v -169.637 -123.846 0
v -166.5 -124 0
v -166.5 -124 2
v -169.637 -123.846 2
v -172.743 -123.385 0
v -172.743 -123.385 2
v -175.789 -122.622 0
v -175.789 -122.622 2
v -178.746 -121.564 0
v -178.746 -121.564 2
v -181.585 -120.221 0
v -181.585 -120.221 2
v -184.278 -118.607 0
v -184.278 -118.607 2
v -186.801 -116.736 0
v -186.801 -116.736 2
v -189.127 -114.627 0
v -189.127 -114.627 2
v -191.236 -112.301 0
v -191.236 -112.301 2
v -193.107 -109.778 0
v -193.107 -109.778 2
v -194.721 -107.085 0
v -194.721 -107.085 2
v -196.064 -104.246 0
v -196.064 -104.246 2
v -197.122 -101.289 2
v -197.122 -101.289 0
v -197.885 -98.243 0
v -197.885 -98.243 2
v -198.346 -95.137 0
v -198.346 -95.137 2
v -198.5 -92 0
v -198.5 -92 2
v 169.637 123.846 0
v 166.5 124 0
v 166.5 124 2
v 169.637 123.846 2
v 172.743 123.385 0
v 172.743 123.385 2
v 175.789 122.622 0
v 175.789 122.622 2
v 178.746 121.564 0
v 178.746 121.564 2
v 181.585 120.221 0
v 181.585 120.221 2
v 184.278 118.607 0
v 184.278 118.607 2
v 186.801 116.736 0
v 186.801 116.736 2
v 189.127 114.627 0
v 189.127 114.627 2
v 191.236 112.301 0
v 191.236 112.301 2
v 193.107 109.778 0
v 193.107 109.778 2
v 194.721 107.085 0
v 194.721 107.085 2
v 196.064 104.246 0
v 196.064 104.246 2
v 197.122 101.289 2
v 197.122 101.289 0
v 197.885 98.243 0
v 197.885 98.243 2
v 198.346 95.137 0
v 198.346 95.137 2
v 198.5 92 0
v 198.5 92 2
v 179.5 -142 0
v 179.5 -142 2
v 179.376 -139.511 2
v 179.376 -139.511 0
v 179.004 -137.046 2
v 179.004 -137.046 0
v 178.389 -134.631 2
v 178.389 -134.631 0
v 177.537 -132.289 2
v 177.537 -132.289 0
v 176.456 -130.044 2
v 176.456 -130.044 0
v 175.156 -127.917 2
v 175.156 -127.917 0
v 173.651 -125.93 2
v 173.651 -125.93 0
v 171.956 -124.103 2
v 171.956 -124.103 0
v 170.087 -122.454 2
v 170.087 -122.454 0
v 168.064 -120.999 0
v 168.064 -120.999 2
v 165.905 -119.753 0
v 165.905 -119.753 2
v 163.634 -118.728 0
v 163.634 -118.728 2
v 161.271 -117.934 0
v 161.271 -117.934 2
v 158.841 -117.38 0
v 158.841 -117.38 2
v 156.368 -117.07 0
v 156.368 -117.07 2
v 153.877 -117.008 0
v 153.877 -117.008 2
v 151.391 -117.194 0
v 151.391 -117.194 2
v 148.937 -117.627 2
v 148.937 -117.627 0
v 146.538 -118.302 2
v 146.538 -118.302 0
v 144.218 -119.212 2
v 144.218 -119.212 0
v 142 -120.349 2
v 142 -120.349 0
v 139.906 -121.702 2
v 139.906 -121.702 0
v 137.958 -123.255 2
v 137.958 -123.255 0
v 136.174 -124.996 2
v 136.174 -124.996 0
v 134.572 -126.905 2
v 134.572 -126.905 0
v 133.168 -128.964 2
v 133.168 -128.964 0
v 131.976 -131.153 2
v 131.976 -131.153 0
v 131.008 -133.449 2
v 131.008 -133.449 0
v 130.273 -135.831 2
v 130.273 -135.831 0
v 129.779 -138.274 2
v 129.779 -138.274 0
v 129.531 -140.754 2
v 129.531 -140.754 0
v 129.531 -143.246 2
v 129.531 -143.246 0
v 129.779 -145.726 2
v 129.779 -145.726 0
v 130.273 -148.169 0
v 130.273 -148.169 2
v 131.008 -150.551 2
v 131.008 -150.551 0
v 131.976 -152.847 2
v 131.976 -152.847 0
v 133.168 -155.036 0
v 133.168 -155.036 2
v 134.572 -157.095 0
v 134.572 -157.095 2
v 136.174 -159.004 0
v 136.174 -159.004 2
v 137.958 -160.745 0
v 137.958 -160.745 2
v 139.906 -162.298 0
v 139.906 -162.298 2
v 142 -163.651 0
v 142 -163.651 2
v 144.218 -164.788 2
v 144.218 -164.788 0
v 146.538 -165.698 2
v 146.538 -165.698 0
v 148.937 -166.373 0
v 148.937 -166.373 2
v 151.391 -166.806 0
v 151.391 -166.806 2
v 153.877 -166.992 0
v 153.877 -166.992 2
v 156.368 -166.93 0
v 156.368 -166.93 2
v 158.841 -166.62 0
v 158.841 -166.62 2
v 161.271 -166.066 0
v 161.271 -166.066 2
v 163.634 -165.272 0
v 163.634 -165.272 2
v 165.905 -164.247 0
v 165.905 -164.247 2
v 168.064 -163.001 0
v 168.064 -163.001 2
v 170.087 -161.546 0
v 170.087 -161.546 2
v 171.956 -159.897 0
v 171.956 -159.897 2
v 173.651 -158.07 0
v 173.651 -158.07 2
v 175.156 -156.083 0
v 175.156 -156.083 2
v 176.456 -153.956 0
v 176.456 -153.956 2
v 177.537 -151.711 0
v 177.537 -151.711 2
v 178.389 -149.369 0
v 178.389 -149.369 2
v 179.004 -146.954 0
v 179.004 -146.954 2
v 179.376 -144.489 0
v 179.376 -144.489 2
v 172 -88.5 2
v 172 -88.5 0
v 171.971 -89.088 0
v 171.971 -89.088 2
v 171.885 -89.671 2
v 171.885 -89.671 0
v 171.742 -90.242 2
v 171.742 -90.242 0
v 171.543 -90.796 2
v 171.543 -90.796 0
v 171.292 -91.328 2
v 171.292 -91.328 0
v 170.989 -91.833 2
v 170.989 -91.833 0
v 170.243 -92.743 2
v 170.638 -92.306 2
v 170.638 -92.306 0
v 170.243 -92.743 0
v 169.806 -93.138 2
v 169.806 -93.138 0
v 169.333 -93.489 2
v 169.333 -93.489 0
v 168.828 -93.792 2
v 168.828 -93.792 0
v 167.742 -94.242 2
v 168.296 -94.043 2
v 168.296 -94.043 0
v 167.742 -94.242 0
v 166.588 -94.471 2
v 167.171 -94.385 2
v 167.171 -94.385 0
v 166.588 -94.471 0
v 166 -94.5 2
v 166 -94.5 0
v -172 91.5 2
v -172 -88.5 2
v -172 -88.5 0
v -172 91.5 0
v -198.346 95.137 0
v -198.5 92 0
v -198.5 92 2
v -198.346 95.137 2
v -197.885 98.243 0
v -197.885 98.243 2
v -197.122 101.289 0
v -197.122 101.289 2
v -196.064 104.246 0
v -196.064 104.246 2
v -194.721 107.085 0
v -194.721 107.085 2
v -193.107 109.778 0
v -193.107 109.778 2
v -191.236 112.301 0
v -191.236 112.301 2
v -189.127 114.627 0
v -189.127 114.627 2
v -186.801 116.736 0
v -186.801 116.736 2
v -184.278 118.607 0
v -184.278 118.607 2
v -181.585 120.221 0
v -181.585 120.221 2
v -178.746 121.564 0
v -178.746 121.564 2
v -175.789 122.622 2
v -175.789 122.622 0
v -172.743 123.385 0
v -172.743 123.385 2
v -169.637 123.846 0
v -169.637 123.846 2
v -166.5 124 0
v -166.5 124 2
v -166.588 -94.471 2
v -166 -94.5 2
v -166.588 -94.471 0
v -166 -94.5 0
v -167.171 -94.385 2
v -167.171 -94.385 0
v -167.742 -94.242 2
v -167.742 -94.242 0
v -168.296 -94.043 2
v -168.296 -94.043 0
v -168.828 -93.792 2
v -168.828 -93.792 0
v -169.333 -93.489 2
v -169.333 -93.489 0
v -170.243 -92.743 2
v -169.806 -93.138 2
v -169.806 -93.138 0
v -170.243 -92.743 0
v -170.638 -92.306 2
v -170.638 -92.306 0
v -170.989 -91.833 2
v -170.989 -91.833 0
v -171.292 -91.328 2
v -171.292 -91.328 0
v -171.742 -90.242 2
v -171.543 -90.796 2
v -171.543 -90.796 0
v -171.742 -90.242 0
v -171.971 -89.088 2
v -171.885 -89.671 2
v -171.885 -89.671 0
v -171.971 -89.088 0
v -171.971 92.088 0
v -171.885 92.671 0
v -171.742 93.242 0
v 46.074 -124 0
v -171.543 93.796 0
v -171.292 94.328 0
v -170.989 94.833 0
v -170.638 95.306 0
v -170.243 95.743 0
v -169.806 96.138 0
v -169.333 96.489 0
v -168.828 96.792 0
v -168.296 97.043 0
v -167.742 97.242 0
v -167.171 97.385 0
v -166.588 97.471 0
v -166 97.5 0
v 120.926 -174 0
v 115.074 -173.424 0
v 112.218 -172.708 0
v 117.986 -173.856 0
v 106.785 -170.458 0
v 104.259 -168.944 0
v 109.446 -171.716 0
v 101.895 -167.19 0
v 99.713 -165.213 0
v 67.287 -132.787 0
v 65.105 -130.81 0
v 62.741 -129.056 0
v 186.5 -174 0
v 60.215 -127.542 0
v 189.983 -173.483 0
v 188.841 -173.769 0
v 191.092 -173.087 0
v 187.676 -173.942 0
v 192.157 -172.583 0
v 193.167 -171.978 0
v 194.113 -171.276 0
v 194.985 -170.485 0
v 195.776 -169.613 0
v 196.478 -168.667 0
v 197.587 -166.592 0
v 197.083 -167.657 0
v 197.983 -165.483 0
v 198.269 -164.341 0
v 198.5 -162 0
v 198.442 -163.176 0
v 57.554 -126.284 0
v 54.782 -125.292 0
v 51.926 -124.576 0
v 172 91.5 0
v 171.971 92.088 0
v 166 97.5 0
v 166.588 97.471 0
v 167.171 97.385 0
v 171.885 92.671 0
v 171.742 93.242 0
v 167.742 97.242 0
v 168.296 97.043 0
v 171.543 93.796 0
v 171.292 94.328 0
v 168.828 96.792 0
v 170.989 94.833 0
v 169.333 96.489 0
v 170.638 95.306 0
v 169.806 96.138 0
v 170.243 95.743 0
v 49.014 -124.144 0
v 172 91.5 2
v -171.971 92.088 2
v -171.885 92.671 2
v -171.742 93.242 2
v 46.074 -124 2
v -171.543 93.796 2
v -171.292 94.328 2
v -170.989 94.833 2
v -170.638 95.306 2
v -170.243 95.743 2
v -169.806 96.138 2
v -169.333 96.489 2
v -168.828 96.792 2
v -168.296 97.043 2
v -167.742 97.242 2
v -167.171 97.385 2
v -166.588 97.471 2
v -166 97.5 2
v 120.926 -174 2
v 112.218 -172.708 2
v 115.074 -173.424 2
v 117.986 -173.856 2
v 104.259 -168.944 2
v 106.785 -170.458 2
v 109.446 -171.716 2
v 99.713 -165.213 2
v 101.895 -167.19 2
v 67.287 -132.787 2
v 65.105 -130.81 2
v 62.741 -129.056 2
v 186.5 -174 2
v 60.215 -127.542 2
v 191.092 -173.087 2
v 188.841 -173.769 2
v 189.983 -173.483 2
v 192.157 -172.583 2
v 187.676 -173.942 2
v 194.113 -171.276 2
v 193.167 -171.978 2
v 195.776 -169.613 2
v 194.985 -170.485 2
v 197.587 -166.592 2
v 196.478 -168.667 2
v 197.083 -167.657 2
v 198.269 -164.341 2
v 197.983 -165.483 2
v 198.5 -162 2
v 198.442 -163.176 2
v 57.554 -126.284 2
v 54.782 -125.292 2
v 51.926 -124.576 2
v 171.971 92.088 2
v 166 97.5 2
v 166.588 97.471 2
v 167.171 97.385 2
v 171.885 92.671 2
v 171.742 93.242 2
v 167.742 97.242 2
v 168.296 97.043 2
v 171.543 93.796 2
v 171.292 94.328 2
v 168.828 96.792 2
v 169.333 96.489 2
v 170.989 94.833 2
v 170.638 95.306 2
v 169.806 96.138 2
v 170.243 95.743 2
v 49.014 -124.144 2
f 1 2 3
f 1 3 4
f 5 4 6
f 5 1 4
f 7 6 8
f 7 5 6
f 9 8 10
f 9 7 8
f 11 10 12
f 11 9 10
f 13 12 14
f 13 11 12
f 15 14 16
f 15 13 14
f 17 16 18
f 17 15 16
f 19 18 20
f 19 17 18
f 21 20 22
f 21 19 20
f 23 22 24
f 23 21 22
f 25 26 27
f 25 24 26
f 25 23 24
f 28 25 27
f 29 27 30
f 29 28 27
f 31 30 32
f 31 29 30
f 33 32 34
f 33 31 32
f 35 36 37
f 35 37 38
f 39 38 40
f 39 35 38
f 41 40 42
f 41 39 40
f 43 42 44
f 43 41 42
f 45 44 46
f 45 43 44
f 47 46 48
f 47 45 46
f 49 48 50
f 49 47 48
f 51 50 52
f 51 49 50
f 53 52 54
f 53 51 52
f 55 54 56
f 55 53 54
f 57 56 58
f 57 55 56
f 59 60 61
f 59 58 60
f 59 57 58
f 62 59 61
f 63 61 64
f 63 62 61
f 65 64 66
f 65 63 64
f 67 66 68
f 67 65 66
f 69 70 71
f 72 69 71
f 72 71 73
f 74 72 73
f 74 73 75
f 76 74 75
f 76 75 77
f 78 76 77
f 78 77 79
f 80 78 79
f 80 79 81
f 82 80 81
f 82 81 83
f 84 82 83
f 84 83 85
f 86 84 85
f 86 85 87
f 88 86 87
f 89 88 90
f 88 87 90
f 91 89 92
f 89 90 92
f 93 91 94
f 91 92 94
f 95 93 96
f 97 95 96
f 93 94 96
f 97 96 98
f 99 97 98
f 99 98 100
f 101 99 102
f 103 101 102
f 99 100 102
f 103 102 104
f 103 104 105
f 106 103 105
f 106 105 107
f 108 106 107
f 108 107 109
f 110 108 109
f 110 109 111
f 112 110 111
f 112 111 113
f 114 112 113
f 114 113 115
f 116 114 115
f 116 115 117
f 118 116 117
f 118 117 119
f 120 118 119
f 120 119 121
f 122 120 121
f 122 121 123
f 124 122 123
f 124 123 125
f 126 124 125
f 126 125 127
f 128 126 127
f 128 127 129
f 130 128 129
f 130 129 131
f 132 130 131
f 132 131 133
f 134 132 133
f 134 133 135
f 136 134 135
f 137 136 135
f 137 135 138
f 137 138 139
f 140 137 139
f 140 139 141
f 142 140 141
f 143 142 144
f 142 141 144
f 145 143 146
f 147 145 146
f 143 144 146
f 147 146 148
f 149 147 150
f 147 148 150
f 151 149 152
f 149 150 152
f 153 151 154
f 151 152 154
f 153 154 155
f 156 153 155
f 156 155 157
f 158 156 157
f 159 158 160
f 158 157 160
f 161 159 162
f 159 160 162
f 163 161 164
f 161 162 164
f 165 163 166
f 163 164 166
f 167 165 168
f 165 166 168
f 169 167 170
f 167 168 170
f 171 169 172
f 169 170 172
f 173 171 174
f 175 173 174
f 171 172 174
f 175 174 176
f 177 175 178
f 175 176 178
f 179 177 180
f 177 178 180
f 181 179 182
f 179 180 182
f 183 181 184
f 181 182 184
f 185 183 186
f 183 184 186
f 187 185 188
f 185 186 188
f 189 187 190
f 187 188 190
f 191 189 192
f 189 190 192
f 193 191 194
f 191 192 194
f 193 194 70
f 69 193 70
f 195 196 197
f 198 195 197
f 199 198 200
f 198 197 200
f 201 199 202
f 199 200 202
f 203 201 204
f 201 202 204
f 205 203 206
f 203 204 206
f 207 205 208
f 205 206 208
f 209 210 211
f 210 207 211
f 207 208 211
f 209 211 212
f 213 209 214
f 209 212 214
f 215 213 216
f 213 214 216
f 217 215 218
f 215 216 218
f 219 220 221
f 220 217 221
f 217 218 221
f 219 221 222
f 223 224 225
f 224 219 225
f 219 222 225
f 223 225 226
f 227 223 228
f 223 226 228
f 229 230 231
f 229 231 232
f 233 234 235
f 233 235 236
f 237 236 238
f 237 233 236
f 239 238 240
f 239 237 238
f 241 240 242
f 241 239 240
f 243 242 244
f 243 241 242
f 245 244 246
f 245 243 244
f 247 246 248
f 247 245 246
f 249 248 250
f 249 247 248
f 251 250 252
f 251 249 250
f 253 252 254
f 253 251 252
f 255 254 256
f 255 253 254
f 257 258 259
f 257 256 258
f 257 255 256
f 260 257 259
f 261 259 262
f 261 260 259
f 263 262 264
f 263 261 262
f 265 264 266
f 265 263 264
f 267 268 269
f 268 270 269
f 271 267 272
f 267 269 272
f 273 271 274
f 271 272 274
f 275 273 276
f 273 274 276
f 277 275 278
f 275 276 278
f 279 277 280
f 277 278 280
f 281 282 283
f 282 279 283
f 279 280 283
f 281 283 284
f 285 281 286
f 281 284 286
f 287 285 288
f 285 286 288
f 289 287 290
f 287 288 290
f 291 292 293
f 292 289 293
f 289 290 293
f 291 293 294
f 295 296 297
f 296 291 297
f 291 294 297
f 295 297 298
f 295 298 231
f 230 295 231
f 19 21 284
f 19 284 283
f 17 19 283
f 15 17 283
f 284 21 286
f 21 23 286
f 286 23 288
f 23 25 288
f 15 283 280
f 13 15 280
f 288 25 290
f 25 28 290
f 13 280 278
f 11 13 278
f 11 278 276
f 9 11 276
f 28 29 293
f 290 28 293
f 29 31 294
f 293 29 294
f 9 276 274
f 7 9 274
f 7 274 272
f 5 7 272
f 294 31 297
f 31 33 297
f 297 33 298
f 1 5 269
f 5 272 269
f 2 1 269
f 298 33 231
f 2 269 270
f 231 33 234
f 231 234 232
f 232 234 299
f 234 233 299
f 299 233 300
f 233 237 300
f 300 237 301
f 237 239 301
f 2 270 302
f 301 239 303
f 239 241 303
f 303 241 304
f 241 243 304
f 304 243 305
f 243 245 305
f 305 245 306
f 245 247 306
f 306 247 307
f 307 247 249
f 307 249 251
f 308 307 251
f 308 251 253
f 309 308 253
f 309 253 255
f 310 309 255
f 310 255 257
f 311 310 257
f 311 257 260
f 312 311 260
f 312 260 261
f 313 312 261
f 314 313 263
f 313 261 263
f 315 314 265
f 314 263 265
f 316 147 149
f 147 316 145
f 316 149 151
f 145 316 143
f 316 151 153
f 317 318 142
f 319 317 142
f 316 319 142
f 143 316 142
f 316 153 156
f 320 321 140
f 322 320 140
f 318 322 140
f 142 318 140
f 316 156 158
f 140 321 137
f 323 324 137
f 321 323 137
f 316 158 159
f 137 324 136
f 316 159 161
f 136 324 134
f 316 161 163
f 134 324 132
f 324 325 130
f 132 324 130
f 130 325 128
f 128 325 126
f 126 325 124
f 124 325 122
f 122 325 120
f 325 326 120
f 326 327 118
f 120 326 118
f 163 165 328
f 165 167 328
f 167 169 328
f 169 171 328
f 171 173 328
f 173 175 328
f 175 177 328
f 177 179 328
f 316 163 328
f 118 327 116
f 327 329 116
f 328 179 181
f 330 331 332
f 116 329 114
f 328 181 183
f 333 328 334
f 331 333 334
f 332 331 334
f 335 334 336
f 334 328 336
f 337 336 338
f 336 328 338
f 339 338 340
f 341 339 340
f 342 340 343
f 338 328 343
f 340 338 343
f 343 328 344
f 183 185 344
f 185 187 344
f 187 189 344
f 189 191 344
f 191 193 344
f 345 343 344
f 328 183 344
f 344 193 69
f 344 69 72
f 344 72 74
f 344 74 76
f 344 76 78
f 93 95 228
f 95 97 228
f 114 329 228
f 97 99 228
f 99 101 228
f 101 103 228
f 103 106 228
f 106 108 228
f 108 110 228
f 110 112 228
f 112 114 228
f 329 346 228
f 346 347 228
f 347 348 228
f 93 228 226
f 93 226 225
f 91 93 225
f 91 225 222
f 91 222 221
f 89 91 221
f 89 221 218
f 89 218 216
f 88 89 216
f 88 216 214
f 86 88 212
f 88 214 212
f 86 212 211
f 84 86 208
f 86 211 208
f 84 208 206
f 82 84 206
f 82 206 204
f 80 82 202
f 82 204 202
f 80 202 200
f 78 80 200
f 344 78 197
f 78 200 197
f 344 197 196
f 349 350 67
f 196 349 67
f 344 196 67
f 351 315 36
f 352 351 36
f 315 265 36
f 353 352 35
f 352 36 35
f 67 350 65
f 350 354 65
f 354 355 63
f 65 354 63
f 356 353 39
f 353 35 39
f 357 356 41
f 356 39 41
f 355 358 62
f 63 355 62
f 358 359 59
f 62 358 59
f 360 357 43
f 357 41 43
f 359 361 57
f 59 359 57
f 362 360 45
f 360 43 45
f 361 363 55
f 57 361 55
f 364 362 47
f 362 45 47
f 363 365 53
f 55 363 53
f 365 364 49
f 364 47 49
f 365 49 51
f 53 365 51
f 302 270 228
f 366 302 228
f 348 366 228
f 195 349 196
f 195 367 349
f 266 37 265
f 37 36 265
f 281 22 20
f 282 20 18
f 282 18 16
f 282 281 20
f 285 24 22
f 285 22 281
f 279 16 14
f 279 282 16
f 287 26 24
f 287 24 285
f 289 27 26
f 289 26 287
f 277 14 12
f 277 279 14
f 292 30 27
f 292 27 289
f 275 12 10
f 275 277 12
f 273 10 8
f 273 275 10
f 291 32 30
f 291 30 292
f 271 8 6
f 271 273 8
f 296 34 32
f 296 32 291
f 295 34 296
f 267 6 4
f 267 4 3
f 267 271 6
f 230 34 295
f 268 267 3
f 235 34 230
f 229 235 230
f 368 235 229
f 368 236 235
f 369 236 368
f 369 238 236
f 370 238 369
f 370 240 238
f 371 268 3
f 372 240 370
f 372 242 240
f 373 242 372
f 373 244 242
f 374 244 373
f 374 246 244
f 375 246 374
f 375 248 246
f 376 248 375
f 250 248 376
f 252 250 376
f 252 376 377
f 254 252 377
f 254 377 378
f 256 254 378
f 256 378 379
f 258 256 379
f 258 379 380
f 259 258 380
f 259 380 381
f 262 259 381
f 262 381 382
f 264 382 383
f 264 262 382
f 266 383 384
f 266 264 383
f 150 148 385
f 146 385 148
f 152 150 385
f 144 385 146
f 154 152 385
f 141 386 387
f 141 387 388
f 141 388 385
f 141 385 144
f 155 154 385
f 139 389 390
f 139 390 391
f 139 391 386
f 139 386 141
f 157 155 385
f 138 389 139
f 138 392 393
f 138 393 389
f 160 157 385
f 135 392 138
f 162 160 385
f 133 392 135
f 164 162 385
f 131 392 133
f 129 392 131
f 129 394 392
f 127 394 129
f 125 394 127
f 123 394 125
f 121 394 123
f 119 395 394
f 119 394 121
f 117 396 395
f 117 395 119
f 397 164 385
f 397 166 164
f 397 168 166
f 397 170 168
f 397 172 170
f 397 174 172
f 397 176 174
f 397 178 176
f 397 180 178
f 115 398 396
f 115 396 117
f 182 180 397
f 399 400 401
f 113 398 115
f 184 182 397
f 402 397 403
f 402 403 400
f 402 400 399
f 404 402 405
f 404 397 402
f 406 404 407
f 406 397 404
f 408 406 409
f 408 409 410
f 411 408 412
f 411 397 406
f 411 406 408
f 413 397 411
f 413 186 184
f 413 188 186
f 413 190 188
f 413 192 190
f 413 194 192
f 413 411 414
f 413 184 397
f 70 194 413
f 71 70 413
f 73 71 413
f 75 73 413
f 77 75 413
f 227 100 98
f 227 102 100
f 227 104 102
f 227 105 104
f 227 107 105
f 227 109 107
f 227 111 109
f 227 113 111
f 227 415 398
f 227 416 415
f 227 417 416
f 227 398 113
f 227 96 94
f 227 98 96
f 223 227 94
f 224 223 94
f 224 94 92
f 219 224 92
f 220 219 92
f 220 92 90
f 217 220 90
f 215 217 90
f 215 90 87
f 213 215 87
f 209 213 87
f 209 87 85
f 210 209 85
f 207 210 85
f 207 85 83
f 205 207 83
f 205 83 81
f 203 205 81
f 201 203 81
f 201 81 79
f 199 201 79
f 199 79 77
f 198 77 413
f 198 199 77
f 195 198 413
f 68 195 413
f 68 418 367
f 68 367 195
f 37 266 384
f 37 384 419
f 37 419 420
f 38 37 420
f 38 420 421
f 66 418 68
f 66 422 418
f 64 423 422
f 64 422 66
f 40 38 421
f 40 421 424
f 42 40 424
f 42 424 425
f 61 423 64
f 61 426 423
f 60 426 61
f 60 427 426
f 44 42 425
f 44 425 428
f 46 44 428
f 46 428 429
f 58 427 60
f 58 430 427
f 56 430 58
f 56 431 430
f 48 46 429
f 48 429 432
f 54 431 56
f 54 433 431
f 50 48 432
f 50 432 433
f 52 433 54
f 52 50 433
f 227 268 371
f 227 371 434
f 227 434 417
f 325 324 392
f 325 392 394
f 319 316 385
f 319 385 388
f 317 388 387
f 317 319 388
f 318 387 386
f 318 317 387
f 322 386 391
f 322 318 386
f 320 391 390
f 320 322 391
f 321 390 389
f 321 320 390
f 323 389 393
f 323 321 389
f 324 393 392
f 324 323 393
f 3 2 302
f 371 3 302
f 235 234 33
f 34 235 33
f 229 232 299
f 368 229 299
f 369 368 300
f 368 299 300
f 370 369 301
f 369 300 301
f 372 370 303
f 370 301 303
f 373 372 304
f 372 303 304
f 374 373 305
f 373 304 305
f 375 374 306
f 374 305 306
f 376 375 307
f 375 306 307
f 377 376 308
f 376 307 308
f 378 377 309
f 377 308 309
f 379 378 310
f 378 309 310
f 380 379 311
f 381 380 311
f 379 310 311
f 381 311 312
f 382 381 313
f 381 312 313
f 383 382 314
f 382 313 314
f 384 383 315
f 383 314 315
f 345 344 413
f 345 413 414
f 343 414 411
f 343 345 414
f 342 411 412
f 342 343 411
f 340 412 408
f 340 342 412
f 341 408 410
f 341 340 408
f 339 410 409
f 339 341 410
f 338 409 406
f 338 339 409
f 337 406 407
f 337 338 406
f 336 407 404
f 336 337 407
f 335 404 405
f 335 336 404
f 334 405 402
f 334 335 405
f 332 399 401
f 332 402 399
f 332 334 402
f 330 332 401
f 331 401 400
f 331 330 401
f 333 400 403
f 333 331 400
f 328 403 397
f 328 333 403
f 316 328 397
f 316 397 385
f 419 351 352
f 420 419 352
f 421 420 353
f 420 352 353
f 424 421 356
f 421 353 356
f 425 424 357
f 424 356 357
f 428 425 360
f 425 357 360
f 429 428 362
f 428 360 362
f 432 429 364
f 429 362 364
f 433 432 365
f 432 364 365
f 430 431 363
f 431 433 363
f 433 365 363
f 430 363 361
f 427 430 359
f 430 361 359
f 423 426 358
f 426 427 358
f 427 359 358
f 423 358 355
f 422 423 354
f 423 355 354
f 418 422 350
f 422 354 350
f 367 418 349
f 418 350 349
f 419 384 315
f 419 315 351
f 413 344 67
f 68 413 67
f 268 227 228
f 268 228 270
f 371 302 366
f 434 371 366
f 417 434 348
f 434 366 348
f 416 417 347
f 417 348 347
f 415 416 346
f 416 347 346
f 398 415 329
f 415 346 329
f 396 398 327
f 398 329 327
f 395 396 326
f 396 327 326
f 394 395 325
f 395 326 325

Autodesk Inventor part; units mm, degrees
ref_plane "YZ Plane" through (0, 0, 0) normal (1, 0, 0) x (0, 1, 0)
ref_plane "XZ Plane" through (0, 0, 0) normal (0, 1, 0) x (-1, 0, 0)
ref_plane "XY Plane" through (0, 0, 0) normal (0, 0, 1) x (1, 0, 0)
sketch "Эскиз1" plane through (0, 0, 0) normal (0, 0, 1) x (1, 0, 0)
  line L0 (-166.5, -124) -> (46.0736, -124)
  line L1 (198.5, -124) -> (198.5, 92)
  line L2 (166.5, 124) -> (-166.5, 124)
  line L3 (-198.5, 92) -> (-198.5, -92)
  line L4 (-198.5, -124) -> (198.5, 124) construction
  line L5 (198.5, -124) -> (-198.5, 124) construction
  arc A0 (-166.5, 124) -> (-198.5, 92) centre (-166.5, 92) ccw
  arc A1 (198.5, 92) -> (166.5, 124) centre (166.5, 92) ccw
  arc A2 (-198.5, -92) -> (-166.5, -124) centre (-166.5, -92) ccw
  line L6 (198.5, -124) -> (198.5, -162)
  line L7 (186.5, -174) -> (120.9264, -174)
  line L8 (99.7132, -165.2132) -> (67.2868, -132.7868)
  arc A3 (186.5, -174) -> (198.5, -162) centre (186.5, -162) ccw
  arc A4 (99.7132, -165.2132) -> (120.9264, -174) centre (120.9264, -144) ccw
  arc A5 (67.2868, -132.7868) -> (46.0736, -124) centre (46.0736, -154) ccw
  point P0 (0, 0)
  point P1 (198.5, -174)
  point P2 (108.5, -174)
  dimension "d2" = 397
  dimension "d3" = 248
  dimension "d4" = 32
  dimension "d5" = 298
  dimension "d6" = 12
  dimension "d7" = 50
  dimension "d8" = 90
  dimension "d9" = 135
  dimension "d10" = 30
extrude "Пластина1" add sketch "Эскиз1" along normal blind 2
sketch "Эскиз5" plane through (0, 0, 2) normal (0, 0, 1) x (1, 0, 0)
  line L0 (198.5, 92) -> (198.5, -162) projected
  arc A0 (198.5, 92) -> (166.5, 124) centre (166.5, 92) ccw projected
  line L1 (-166.5, 124) -> (166.5, 124) projected
  arc A1 (-166.5, 124) -> (-198.5, 92) centre (-166.5, 92) ccw projected
  line L2 (-198.5, -92) -> (-198.5, 92) projected
  arc A2 (-198.5, -92) -> (-166.5, -124) centre (-166.5, -92) ccw projected
  line L3 (46.0736, -124) -> (-166.5, -124) projected
  arc A3 (67.2868, -132.7868) -> (46.0736, -124) centre (46.0736, -154) ccw projected
  line L4 (99.7132, -165.2132) -> (67.2868, -132.7868) projected
  arc A4 (99.7132, -165.2132) -> (120.9264, -174) centre (120.9264, -144) ccw projected
  line L5 (186.5, -174) -> (120.9264, -174) projected
  arc A5 (186.5, -174) -> (198.5, -162) centre (186.5, -162) ccw projected
  circle A6 centre (154.5, -142) radius 25
  line L6 (-172, 97.5) -> (172, 97.5)
  line L7 (172, 97.5) -> (172, -94.5)
  line L8 (172, -94.5) -> (-172, -94.5)
  line L9 (-172, -94.5) -> (-172, 97.5)
  point P0 (0, 0)
  dimension "d57" = 50
  dimension "d58" = 26.5
  dimension "d59" = 26.5
  dimension "d60" = 26.5
  dimension "d61" = 29.5
  dimension "d62" = 44
  dimension "d63" = 32
extrude "Вырез4" cut sketch "Эскиз5" against normal blind 2 contours A6 | L6 L7 L8 L9
fillet "УглСкругление1" radius 6 4 edges at (-172, 97.5, 1) (172, 97.5, 1) (172, -94.5, 1) (-172, -94.5, 1)
equation "\"d59\" = d60"
equation "\"d64\" = Толщина"
equation "\"d12\" = Толщина"
equation "\"Радиус_гибки\" = Толщина"
equation "\"Ширина_просечки\" = Толщина"
equation "\"Глубина_просечки\" = 0.5 * Толщина"
equation "\"Размер_просечки\" = 4 * Толщина"
equation "\"Мин_остаток\" = 2 * Толщина"
equation "\"Радиус_перехода\" = Радиус_гибки"
equation "\"Радиус_Якоби\" = Радиус_гибки"
equation "\"Размер_зазора\" = Толщина"
equation "\"Толщина\" = 2"
properties part number "Стекло"
